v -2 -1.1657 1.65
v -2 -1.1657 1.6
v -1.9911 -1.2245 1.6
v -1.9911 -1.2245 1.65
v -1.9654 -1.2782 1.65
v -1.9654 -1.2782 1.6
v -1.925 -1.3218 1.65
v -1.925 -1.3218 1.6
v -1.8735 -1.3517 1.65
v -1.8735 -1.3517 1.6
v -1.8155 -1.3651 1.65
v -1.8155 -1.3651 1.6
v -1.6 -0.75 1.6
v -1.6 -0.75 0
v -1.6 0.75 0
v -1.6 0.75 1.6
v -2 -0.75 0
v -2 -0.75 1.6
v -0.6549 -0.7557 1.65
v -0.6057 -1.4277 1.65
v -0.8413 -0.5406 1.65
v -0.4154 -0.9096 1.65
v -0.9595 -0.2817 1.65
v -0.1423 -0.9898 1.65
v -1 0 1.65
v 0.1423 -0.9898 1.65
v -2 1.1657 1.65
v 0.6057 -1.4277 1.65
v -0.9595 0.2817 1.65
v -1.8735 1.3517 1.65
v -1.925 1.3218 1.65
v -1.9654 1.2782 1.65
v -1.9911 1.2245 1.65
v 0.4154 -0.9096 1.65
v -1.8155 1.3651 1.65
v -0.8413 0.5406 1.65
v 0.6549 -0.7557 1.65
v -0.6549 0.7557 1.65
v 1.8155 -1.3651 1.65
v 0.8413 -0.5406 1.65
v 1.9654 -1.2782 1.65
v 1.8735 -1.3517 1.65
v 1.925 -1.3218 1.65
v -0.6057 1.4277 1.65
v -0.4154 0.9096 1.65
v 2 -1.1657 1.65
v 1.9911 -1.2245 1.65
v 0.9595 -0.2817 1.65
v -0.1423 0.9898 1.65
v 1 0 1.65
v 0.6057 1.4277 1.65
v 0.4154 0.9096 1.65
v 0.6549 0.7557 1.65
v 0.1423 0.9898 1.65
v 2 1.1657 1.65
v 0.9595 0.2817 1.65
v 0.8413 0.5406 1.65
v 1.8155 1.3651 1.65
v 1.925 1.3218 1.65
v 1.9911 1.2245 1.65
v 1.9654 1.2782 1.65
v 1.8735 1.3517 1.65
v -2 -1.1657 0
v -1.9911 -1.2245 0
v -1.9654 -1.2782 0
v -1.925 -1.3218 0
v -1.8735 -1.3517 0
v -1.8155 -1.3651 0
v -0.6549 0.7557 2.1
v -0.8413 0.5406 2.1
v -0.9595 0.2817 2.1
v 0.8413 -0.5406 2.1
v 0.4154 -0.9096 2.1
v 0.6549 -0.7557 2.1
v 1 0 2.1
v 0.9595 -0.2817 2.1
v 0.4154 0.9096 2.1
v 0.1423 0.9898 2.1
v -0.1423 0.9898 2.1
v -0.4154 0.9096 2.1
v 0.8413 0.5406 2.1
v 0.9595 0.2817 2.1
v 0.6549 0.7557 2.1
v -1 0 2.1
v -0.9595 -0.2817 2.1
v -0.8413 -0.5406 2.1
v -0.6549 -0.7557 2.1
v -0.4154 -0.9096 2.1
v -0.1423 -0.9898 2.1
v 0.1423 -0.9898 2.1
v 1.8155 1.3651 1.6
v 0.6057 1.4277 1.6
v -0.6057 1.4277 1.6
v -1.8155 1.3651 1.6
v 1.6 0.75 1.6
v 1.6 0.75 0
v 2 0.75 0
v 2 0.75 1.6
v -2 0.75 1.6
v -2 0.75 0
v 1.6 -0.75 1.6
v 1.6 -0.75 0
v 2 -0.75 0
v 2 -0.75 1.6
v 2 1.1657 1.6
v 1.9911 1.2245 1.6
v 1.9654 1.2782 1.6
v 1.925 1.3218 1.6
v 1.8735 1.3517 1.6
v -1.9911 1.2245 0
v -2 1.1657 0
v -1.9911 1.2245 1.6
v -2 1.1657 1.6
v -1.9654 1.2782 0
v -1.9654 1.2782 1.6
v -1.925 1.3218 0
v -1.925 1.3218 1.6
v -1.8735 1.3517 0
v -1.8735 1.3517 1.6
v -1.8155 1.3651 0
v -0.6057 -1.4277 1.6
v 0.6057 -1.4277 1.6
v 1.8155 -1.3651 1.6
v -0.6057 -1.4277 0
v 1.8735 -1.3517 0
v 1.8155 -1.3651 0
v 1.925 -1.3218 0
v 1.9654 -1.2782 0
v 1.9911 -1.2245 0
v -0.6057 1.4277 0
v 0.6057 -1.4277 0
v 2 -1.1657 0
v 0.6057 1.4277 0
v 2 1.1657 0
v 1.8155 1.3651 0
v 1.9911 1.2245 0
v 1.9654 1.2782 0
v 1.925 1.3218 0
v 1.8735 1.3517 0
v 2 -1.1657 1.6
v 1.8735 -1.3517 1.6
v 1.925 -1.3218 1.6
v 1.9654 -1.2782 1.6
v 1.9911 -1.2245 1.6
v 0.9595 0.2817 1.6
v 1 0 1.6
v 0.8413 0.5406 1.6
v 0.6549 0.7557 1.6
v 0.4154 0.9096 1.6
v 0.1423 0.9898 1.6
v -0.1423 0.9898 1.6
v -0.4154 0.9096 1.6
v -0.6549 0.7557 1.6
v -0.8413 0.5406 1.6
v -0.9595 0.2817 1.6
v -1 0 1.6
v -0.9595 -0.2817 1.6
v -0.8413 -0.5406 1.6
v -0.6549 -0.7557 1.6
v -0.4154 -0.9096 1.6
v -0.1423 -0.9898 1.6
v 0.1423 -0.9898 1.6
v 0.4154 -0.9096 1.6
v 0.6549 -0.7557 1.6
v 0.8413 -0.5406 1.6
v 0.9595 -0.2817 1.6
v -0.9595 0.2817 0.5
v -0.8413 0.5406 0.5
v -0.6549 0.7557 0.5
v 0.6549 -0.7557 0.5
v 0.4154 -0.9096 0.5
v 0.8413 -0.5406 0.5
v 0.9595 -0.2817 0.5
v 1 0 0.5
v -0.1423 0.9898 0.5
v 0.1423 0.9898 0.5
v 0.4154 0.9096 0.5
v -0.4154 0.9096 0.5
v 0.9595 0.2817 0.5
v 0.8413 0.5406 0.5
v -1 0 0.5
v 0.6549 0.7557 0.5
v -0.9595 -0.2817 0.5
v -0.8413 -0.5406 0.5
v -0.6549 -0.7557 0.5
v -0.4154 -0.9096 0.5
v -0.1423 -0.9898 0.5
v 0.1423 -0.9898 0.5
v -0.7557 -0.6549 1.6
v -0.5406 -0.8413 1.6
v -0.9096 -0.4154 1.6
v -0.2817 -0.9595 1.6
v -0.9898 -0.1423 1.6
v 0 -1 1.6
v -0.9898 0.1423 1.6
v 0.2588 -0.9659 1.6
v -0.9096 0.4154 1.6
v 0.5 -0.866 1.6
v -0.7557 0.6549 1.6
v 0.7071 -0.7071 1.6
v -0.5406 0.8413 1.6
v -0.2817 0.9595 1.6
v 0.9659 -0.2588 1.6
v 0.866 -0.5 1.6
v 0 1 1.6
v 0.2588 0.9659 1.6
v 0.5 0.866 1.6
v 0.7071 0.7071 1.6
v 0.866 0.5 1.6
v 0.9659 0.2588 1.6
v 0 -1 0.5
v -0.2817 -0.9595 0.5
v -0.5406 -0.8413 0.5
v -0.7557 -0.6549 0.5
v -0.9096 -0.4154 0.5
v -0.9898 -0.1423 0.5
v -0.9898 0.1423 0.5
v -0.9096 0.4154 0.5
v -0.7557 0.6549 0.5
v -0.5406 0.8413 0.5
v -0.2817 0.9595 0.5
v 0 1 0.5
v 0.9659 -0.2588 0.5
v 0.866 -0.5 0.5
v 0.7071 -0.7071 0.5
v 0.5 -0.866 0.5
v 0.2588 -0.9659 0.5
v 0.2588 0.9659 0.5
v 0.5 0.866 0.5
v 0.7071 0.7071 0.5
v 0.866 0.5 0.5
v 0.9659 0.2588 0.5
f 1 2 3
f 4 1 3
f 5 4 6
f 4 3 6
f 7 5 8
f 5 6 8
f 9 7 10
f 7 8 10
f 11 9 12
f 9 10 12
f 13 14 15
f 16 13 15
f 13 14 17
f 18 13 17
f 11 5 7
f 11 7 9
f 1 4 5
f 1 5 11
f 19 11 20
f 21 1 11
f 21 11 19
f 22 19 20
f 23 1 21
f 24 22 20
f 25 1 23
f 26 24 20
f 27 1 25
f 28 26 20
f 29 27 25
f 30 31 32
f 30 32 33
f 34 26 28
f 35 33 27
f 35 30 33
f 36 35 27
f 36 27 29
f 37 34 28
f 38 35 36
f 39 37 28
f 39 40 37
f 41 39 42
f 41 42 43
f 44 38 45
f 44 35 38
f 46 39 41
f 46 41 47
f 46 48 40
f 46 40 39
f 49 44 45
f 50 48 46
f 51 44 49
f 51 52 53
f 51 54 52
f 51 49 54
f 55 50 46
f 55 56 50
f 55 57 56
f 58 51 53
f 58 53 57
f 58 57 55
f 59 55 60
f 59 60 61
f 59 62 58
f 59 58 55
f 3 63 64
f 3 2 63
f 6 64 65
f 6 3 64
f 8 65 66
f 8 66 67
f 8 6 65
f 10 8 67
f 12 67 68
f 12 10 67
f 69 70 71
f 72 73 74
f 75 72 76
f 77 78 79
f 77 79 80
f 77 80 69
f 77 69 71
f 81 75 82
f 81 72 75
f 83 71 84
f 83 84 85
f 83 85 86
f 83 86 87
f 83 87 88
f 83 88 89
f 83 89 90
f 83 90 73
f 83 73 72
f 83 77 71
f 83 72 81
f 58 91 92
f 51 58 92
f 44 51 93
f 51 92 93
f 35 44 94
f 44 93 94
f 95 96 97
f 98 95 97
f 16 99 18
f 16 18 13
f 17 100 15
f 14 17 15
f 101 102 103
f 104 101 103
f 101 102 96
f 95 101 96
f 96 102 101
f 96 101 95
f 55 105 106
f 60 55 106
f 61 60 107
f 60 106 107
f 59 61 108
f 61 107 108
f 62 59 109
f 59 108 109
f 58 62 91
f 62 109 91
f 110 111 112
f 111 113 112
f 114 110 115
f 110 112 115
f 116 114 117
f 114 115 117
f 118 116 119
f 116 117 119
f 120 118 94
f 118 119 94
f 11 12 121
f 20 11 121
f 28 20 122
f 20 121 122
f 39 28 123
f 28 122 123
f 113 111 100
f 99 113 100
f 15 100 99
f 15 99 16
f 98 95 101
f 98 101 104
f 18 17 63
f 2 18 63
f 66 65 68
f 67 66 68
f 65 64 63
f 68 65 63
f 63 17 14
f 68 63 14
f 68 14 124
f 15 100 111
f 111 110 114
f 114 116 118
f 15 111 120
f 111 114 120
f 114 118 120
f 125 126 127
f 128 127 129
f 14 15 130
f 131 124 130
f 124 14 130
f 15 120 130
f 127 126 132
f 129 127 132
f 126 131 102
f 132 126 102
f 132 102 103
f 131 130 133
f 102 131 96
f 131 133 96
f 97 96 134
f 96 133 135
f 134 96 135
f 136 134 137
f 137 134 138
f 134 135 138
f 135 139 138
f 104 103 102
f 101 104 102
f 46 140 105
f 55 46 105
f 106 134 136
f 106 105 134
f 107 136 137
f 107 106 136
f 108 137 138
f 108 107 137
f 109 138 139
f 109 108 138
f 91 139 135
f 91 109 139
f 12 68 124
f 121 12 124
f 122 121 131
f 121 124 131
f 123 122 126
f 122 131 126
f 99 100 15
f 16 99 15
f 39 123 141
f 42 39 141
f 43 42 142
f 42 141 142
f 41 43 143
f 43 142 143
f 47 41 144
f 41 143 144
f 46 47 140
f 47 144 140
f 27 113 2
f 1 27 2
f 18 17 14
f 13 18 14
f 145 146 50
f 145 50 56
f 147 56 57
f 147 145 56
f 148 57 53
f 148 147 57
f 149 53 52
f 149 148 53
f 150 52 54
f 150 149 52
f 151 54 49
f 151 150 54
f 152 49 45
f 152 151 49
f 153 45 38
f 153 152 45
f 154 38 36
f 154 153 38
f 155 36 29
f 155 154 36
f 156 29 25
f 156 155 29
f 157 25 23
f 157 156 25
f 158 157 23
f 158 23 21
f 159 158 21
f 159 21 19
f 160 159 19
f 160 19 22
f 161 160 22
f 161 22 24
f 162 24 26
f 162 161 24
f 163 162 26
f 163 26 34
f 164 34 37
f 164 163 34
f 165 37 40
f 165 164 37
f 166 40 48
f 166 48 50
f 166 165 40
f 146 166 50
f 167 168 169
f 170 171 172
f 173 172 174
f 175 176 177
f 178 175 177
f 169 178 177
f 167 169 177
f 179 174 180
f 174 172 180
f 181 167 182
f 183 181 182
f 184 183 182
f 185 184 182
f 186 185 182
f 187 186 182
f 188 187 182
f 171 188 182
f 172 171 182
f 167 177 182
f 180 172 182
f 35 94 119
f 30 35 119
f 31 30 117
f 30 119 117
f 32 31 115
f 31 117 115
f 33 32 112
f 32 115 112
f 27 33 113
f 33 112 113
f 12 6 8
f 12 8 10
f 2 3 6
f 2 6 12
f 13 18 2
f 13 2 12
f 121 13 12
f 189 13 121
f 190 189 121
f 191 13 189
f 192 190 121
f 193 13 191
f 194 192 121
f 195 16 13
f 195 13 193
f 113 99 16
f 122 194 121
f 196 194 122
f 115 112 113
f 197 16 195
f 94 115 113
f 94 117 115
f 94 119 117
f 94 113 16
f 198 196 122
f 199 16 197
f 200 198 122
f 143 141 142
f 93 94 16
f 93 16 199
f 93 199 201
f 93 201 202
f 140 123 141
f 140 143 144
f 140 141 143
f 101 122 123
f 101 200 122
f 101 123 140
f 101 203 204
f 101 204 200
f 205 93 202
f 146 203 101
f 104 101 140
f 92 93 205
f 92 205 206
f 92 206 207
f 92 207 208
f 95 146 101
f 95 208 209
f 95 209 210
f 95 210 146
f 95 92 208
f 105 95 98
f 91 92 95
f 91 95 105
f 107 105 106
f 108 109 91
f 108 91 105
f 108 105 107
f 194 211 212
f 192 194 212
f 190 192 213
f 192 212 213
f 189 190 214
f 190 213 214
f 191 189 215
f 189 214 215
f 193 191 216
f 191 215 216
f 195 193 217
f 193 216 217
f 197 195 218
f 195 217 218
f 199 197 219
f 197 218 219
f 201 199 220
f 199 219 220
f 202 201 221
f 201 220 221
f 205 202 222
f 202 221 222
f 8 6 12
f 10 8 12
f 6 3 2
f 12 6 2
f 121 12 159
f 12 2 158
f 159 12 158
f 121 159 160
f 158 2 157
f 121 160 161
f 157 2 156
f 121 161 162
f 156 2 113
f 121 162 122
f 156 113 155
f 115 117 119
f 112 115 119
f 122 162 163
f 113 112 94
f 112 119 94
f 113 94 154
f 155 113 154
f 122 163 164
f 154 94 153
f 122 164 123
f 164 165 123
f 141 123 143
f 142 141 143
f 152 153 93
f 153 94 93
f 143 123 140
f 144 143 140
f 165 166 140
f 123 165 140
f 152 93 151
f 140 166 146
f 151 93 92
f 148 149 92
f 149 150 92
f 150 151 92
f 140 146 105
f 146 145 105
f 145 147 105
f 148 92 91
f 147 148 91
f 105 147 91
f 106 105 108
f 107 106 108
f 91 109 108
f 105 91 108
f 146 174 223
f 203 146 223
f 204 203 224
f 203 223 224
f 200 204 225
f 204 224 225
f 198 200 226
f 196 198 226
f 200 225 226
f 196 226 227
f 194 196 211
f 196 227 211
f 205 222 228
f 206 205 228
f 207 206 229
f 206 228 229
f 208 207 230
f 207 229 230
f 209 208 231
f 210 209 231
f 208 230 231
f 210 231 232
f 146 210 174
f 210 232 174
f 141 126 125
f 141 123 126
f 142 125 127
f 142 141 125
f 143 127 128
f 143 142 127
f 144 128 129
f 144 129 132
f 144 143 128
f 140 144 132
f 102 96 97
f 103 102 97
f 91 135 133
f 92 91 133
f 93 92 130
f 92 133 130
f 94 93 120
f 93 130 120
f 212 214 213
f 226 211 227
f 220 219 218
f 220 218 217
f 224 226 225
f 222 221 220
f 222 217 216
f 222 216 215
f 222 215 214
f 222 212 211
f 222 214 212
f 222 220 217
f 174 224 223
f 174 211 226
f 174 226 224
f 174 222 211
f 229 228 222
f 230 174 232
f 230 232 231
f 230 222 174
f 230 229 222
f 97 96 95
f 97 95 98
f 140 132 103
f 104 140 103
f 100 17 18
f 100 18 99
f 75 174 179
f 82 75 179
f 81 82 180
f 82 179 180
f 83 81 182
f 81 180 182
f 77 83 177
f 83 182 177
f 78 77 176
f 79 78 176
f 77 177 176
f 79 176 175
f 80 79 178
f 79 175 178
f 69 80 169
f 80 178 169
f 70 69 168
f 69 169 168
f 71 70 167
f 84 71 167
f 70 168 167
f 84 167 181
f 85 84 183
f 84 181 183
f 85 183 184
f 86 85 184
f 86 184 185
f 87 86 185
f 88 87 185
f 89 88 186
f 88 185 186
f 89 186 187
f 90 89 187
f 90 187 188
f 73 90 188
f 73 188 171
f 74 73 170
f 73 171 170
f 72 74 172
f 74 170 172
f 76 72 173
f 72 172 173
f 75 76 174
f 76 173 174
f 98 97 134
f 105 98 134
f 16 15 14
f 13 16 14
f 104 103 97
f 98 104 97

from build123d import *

# Parameters (mm, degrees)
F1_DEPTH = 1.6
F2_DEPTH = 0.5
F0_W     = 0.4
F0_H     = 1.5
F3_DEPTH = 1.6
F4_R     = 1
F5_DEPTH = 1.6
F6_R     = 0.2
F7_R     = 1
F7_W     = 0.4
F7_H     = 1.5
F8_DEPTH = 0.05


with BuildPart() as f1:
    # F0 (on Top) → F1 (new body)
    with BuildSketch(Plane.XY):
        with BuildLine():
            Line((0, 1.35), (-2, 1.35))
            Line((-2, 1.35), (-2, 0.75))
            Line((-2, 0.75), (-1.6, 0.75))
            Line((-1.6, 0.75), (-1.6, -0.75))
            Line((-1.6, -0.75), (-2, -0.75))
            Line((-2, -0.75), (-2, -1.35))
            Line((-2, -1.35), (0, -1.35))
            Line((0, -1.35), (0, -1))
            ThreePointArc((0, -1), (-1, 0), (0, 1))
            Line((0, 1), (0, 1.35))
        make_face()
        with BuildLine():
            ThreePointArc((2, 1.35), (0, 1.4355056225), (-2, 1.35))
            Line((-2, 1.35), (0, 1.35))
            Line((0, 1.35), (2, 1.35))
        make_face()
        with BuildLine():
            Line((2, 1.35), (0, 1.35))
            Line((0, 1.35), (0, 1))
            ThreePointArc((0, 1), (0.7071067812, 0.7071067812), (1, 0))
            ThreePointArc((1, 0), (0.7071067812, -0.7071067812), (0, -1))
            Line((0, -1), (0, -1.35))
            Line((0, -1.35), (2, -1.35))
            Line((2, -1.35), (2, -0.75))
            Line((2, -0.75), (1.6, -0.75))
            Line((1.6, -0.75), (1.6, 0.75))
            Line((1.6, 0.75), (2, 0.75))
            Line((2, 0.75), (2, 1.35))
        make_face()
        with BuildLine():
            Line((0, -1.35), (-2, -1.35))
            ThreePointArc((-2, -1.35), (0, -1.4355056225), (2, -1.35))
            Line((2, -1.35), (0, -1.35))
        make_face()
    extrude(amount=F1_DEPTH)

    # F0 (on Top) → F2 (join)
    with BuildSketch(Plane.XY):
        with BuildLine():
            Line((0, -1), (0, 1))
            ThreePointArc((0, 1), (-1, 0), (0, -1))
        make_face()
        with BuildLine():
            ThreePointArc((1, 0), (0.7071067812, 0.7071067812), (0, 1))
            Line((0, 1), (0, -1))
            ThreePointArc((0, -1), (0.7071067812, -0.7071067812), (1, 0))
        make_face()
    extrude(amount=F2_DEPTH)

    # F6
    f6_edges = [f1.edges().sort_by_distance(p)[0] for p in [
        (-2, -1.35, 0.8),
        (2, -1.35, 0.8),
        (-2, 1.35, 0.8),
        (2, 1.35, 0.8),
    ]]
    fillet(f6_edges, radius=F6_R)


with BuildPart() as f3:
    # F0 (on Top) → F3 (new body)
    with BuildSketch(Plane.XY):
        with Locations((-1.8, 0)):
            Rectangle(F0_W, F0_H)
    extrude(amount=F3_DEPTH)


with BuildPart() as f3b:
    # F0 (on Top) → F3, piece 2 (new body)
    with BuildSketch(Plane.XY):
        with Locations((1.8, 0)):
            Rectangle(F0_W, F0_H)
    extrude(amount=F3_DEPTH)


with BuildPart() as f5:
    # F4 (on face) → F5 (new body)
    with BuildSketch(Plane.XY.offset(0.5)):
        Circle(F4_R)
    extrude(amount=F5_DEPTH)


with BuildPart() as f8:
    # F7 (on face) → F8 (new body)
    with BuildSketch(Plane.XY.offset(1.6)):
        with BuildLine():
            ThreePointArc((2, 1.16567235), (1.9467975417, 1.3015049004), (1.8154951824, 1.3650711948))
            ThreePointArc((1.8154951824, 1.3650711948), (0, 1.4355056225), (-1.8154951824, 1.3650711948))
            ThreePointArc((-1.8154951824, 1.3650711948), (-1.9467975417, 1.3015049004), (-2, 1.16567235))
            Line((-2, 1.16567235), (-2, 0.75))
            Line((-2, 0.75), (-1.6, 0.75))
            Line((-1.6, 0.75), (-1.6, -0.75))
            Line((-1.6, -0.75), (-2, -0.75))
            Line((-2, -0.75), (-2, -1.16567235))
            ThreePointArc((-2, -1.16567235), (-1.9467975417, -1.3015049004), (-1.8154951824, -1.3650711948))
            ThreePointArc((-1.8154951824, -1.3650711948), (0, -1.4355056225), (1.8154951824, -1.3650711948))
            ThreePointArc((1.8154951824, -1.3650711948), (1.9467975417, -1.3015049004), (2, -1.16567235))
            Line((2, -1.16567235), (2, -0.75))
            Line((2, -0.75), (1.6, -0.75))
            Line((1.6, -0.75), (1.6, 0.75))
            Line((1.6, 0.75), (2, 0.75))
            Line((2, 0.75), (2, 1.16567235))
        make_face()
        Circle(F7_R, mode=Mode.SUBTRACT)
        with Locations((1.8, 0)):
            Rectangle(F7_W, F7_H)
        with Locations((-1.8, 0)):
            Rectangle(F7_W, F7_H)
    extrude(amount=F8_DEPTH)


solid = Compound([f1.part, f3.part, f3b.part, f5.part, f8.part])
